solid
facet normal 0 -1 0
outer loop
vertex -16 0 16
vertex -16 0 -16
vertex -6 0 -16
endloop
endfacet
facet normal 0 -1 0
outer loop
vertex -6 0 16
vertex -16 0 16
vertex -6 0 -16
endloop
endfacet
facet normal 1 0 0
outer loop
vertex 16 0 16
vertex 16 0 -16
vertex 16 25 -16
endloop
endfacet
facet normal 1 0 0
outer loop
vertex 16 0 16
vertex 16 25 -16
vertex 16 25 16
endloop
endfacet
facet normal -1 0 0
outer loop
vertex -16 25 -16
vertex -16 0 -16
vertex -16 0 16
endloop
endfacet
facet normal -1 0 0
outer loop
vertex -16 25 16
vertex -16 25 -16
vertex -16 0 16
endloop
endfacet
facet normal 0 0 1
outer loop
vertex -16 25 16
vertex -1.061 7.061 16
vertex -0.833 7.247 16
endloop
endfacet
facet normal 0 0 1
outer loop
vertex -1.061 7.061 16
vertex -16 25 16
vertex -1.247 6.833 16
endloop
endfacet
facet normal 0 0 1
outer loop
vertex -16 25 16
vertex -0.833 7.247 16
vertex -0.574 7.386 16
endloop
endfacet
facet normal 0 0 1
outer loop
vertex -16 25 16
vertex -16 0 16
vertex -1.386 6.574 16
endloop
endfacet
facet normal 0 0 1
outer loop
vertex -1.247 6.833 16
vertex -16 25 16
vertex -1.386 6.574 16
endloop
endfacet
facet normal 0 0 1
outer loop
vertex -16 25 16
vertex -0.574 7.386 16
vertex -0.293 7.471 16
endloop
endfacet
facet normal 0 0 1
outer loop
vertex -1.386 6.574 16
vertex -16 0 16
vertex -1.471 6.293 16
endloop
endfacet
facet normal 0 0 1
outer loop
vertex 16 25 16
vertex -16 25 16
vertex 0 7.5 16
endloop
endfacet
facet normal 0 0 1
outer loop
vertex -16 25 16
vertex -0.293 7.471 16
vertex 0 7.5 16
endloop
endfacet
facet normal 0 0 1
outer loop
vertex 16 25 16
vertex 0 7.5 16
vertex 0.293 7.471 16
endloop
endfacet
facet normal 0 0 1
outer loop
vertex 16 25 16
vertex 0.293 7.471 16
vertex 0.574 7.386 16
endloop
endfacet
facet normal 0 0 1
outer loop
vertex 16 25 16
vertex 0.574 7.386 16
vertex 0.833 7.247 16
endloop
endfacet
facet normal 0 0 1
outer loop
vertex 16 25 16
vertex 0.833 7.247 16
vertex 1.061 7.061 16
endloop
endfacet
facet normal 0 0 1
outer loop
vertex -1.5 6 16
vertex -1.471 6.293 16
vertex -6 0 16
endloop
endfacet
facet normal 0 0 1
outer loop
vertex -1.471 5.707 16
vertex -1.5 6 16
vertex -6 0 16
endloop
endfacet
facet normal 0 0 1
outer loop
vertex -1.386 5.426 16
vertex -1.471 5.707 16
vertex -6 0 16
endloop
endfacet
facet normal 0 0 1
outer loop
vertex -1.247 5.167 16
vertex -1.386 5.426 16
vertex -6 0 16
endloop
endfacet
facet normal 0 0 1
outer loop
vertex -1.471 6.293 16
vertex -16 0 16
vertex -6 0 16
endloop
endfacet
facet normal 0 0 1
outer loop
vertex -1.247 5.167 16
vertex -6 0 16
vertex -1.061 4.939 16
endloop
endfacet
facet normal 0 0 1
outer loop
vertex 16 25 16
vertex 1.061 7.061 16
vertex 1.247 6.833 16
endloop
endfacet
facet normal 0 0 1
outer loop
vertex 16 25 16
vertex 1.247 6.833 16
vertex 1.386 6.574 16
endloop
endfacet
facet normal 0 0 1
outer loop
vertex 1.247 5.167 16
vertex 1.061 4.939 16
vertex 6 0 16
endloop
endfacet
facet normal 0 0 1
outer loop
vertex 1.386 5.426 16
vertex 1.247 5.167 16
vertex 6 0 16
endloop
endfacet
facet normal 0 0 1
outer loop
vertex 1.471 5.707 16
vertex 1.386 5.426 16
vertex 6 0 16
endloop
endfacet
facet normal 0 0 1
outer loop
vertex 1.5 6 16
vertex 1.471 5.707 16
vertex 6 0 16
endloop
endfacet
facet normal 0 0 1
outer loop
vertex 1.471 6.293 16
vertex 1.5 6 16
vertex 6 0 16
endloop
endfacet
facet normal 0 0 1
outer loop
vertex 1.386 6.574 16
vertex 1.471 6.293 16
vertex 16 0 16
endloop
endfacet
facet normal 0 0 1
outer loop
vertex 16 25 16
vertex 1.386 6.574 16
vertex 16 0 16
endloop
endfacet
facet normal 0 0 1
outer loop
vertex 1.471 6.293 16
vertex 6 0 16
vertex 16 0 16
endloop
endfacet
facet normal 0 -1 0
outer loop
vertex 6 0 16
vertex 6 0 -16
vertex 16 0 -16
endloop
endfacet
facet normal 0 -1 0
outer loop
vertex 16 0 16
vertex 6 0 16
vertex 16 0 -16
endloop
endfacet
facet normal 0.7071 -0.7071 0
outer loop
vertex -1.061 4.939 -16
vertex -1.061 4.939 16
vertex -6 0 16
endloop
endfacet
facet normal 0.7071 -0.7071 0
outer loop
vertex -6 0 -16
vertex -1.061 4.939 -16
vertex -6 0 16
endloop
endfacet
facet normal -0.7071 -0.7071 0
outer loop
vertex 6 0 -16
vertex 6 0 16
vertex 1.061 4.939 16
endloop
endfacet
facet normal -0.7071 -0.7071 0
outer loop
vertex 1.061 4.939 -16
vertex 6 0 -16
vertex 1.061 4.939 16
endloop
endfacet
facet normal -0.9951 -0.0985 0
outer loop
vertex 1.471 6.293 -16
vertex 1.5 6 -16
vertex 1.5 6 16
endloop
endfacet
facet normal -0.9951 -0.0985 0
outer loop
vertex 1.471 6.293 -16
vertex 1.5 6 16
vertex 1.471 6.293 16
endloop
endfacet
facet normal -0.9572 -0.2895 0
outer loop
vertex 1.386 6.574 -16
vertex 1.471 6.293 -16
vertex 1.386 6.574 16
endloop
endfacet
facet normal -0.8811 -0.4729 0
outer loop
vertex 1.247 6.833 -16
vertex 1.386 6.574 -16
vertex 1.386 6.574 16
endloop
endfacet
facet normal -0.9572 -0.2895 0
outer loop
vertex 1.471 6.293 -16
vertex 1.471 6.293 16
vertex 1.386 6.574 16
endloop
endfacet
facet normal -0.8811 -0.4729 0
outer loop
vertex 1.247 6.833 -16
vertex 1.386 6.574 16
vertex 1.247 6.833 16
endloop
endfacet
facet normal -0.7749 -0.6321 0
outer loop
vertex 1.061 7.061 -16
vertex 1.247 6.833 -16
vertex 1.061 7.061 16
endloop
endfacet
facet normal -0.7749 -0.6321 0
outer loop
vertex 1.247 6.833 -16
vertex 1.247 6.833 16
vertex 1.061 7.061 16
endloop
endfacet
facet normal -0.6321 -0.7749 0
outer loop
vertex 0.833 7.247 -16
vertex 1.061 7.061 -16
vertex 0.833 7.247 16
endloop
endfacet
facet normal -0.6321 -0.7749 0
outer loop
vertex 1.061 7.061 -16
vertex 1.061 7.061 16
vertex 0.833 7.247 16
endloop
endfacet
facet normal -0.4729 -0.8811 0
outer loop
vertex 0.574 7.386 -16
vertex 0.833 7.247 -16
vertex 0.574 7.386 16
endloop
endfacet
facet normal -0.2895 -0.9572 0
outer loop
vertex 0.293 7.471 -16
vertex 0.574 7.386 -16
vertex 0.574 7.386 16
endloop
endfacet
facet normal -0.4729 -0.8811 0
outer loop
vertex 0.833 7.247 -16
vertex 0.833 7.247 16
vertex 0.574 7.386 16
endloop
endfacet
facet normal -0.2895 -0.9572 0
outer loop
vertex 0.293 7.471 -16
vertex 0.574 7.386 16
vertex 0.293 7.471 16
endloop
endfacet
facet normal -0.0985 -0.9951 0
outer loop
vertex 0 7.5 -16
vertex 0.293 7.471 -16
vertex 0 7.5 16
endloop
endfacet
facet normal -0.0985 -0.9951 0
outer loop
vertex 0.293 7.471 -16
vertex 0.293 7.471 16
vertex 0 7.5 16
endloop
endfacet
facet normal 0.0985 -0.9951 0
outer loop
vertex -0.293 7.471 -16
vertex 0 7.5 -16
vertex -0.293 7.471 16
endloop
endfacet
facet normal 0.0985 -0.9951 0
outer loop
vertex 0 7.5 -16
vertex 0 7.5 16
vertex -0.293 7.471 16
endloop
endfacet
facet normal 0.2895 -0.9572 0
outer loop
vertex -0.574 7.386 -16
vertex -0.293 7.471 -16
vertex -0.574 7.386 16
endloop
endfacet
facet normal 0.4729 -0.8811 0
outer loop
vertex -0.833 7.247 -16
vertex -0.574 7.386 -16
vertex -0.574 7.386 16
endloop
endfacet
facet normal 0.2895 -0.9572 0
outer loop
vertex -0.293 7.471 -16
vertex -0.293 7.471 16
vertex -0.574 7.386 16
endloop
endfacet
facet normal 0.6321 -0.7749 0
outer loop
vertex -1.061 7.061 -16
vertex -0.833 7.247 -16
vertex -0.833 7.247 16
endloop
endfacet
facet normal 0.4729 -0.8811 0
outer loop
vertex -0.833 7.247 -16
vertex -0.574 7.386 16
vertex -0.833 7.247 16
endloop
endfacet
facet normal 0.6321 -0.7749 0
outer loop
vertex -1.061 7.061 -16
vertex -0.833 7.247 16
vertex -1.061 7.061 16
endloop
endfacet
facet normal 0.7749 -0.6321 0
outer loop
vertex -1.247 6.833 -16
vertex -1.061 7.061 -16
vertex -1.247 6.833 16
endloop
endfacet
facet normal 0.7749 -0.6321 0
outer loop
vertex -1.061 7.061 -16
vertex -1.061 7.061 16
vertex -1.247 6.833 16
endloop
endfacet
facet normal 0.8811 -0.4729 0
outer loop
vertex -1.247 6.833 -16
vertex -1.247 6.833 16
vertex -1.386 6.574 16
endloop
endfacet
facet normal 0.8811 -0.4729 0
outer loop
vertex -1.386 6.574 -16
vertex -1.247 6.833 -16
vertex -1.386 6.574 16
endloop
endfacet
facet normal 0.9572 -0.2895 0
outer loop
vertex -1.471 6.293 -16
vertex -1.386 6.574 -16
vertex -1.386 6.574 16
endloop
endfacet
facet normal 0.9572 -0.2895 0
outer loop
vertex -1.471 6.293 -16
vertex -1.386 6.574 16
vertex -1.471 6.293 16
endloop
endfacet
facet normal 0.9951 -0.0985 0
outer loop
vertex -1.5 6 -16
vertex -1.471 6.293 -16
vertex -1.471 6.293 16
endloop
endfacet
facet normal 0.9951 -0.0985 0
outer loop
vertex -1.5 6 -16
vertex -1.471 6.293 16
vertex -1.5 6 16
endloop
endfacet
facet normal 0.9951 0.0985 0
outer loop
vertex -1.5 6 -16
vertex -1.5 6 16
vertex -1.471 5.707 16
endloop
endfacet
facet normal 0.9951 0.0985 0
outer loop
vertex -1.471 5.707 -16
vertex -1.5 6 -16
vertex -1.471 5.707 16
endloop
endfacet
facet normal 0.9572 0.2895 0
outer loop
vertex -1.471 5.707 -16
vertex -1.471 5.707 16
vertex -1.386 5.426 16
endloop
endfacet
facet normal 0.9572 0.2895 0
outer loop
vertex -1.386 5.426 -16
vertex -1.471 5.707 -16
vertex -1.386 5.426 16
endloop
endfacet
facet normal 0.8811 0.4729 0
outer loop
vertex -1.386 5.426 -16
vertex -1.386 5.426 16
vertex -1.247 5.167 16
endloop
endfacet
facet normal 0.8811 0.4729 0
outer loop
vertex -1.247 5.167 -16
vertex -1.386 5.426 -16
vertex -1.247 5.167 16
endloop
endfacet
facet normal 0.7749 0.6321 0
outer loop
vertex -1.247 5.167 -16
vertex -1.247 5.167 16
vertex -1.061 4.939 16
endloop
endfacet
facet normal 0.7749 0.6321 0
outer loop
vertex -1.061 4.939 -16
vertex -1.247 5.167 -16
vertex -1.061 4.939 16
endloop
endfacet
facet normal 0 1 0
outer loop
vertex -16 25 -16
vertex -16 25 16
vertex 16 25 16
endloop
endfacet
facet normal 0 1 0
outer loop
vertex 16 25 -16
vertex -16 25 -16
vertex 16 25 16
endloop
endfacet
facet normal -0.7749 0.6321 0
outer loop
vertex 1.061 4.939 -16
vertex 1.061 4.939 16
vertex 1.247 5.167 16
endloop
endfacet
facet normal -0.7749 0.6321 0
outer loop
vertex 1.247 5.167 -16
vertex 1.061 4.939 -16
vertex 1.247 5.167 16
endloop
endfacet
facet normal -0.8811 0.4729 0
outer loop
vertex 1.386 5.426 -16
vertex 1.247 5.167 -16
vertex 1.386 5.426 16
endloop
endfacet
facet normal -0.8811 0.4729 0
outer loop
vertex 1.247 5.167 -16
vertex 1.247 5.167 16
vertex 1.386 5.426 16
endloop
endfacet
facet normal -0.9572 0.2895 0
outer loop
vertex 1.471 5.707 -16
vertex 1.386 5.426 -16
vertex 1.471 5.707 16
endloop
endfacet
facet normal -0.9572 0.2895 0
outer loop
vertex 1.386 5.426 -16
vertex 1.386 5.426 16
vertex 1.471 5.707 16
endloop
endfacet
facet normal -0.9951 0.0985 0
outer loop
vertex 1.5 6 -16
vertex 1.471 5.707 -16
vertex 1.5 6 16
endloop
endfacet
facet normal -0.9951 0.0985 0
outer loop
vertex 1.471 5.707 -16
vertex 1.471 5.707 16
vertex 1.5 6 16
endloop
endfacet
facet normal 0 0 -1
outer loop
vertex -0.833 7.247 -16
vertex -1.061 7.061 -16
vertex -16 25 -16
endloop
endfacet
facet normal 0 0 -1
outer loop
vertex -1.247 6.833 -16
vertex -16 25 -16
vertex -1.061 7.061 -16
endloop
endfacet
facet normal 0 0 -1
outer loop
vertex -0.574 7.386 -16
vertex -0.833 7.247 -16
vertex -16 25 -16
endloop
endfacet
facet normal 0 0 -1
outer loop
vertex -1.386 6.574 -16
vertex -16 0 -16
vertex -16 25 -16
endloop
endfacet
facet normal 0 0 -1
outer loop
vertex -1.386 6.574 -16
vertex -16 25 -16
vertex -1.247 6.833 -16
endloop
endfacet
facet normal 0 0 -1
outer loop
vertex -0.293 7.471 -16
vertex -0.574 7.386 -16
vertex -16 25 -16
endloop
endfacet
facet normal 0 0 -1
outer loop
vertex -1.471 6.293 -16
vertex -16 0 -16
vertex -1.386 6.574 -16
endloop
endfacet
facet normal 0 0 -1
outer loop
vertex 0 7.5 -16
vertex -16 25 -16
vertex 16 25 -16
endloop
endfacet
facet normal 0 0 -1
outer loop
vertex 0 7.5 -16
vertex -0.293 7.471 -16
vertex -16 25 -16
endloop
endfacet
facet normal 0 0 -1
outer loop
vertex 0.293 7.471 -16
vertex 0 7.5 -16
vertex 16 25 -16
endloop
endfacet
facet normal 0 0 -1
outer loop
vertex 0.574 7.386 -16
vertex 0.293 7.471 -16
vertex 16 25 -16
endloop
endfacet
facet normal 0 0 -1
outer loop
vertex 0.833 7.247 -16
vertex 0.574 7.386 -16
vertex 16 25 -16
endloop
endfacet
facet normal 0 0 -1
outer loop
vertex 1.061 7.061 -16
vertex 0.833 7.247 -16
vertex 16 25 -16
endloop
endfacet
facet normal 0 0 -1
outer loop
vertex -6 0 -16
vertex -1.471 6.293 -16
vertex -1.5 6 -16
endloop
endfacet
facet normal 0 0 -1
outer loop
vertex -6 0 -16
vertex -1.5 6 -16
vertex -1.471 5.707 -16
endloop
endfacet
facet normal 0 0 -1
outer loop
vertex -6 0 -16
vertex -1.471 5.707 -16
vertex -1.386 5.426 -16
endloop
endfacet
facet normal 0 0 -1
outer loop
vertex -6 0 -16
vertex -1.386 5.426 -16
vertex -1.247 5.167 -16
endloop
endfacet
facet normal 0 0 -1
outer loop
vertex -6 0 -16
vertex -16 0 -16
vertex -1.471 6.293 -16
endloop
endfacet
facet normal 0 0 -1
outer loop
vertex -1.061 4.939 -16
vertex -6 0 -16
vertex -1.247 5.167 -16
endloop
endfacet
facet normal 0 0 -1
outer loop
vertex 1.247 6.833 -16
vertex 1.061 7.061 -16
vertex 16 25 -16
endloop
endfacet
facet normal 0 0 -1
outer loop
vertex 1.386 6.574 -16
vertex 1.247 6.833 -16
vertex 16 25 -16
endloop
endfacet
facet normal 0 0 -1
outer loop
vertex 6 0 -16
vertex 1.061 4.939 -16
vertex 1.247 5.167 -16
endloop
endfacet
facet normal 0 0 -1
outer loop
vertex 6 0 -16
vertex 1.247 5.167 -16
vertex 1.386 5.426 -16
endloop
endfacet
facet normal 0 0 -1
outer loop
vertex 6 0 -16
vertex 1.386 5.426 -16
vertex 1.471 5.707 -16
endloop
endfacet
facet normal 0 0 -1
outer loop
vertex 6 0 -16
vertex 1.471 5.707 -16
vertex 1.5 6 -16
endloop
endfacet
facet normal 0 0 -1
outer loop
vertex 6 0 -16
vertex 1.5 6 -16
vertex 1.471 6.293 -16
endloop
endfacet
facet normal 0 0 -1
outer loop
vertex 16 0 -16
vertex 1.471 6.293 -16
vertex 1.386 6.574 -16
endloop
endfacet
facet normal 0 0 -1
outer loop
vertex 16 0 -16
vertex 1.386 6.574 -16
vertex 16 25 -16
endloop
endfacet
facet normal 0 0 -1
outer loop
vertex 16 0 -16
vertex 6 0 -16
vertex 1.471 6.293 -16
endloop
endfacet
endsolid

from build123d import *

# Parameters (mm, degrees)
F0_W     = 32
F0_H     = 32
F1_DEPTH = 25
F3_DEPTH = 32.001


with BuildPart() as f1:
    # F0 (on Front) → F1 (new body)
    with BuildSketch(Plane.XZ):
        Rectangle(F0_W, F0_H)
    extrude(amount=-F1_DEPTH)

    # F2 (on face) → F3 (cut, through all)
    with BuildSketch(Plane.XY.offset(16)):
        with BuildLine():
            Line((-1.0606601718, 4.9393398282), (-6, 0))
            Line((-6, 0), (6, 0))
            Line((6, 0), (1.0606601718, 4.9393398282))
            ThreePointArc((1.0606601718, 4.9393398282), (0, 4.5), (-1.0606601718, 4.9393398282))
        make_face()
        with BuildLine():
            ThreePointArc((1.5, 6), (-0.5740251485, 7.3858192988), (-1.0606601718, 4.9393398282))
            Line((-1.0606601718, 4.9393398282), (0, 6))
            Line((0, 6), (1.0606601718, 4.9393398282))
            ThreePointArc((1.0606601718, 4.9393398282), (1.3858192988, 5.4259748515), (1.5, 6))
        make_face()
        with BuildLine():
            Line((0, 6), (-1.0606601718, 4.9393398282))
            ThreePointArc((-1.0606601718, 4.9393398282), (0, 4.5), (1.0606601718, 4.9393398282))
            Line((1.0606601718, 4.9393398282), (0, 6))
        make_face()
    extrude(amount=-F3_DEPTH, mode=Mode.SUBTRACT)


solid = f1.part
